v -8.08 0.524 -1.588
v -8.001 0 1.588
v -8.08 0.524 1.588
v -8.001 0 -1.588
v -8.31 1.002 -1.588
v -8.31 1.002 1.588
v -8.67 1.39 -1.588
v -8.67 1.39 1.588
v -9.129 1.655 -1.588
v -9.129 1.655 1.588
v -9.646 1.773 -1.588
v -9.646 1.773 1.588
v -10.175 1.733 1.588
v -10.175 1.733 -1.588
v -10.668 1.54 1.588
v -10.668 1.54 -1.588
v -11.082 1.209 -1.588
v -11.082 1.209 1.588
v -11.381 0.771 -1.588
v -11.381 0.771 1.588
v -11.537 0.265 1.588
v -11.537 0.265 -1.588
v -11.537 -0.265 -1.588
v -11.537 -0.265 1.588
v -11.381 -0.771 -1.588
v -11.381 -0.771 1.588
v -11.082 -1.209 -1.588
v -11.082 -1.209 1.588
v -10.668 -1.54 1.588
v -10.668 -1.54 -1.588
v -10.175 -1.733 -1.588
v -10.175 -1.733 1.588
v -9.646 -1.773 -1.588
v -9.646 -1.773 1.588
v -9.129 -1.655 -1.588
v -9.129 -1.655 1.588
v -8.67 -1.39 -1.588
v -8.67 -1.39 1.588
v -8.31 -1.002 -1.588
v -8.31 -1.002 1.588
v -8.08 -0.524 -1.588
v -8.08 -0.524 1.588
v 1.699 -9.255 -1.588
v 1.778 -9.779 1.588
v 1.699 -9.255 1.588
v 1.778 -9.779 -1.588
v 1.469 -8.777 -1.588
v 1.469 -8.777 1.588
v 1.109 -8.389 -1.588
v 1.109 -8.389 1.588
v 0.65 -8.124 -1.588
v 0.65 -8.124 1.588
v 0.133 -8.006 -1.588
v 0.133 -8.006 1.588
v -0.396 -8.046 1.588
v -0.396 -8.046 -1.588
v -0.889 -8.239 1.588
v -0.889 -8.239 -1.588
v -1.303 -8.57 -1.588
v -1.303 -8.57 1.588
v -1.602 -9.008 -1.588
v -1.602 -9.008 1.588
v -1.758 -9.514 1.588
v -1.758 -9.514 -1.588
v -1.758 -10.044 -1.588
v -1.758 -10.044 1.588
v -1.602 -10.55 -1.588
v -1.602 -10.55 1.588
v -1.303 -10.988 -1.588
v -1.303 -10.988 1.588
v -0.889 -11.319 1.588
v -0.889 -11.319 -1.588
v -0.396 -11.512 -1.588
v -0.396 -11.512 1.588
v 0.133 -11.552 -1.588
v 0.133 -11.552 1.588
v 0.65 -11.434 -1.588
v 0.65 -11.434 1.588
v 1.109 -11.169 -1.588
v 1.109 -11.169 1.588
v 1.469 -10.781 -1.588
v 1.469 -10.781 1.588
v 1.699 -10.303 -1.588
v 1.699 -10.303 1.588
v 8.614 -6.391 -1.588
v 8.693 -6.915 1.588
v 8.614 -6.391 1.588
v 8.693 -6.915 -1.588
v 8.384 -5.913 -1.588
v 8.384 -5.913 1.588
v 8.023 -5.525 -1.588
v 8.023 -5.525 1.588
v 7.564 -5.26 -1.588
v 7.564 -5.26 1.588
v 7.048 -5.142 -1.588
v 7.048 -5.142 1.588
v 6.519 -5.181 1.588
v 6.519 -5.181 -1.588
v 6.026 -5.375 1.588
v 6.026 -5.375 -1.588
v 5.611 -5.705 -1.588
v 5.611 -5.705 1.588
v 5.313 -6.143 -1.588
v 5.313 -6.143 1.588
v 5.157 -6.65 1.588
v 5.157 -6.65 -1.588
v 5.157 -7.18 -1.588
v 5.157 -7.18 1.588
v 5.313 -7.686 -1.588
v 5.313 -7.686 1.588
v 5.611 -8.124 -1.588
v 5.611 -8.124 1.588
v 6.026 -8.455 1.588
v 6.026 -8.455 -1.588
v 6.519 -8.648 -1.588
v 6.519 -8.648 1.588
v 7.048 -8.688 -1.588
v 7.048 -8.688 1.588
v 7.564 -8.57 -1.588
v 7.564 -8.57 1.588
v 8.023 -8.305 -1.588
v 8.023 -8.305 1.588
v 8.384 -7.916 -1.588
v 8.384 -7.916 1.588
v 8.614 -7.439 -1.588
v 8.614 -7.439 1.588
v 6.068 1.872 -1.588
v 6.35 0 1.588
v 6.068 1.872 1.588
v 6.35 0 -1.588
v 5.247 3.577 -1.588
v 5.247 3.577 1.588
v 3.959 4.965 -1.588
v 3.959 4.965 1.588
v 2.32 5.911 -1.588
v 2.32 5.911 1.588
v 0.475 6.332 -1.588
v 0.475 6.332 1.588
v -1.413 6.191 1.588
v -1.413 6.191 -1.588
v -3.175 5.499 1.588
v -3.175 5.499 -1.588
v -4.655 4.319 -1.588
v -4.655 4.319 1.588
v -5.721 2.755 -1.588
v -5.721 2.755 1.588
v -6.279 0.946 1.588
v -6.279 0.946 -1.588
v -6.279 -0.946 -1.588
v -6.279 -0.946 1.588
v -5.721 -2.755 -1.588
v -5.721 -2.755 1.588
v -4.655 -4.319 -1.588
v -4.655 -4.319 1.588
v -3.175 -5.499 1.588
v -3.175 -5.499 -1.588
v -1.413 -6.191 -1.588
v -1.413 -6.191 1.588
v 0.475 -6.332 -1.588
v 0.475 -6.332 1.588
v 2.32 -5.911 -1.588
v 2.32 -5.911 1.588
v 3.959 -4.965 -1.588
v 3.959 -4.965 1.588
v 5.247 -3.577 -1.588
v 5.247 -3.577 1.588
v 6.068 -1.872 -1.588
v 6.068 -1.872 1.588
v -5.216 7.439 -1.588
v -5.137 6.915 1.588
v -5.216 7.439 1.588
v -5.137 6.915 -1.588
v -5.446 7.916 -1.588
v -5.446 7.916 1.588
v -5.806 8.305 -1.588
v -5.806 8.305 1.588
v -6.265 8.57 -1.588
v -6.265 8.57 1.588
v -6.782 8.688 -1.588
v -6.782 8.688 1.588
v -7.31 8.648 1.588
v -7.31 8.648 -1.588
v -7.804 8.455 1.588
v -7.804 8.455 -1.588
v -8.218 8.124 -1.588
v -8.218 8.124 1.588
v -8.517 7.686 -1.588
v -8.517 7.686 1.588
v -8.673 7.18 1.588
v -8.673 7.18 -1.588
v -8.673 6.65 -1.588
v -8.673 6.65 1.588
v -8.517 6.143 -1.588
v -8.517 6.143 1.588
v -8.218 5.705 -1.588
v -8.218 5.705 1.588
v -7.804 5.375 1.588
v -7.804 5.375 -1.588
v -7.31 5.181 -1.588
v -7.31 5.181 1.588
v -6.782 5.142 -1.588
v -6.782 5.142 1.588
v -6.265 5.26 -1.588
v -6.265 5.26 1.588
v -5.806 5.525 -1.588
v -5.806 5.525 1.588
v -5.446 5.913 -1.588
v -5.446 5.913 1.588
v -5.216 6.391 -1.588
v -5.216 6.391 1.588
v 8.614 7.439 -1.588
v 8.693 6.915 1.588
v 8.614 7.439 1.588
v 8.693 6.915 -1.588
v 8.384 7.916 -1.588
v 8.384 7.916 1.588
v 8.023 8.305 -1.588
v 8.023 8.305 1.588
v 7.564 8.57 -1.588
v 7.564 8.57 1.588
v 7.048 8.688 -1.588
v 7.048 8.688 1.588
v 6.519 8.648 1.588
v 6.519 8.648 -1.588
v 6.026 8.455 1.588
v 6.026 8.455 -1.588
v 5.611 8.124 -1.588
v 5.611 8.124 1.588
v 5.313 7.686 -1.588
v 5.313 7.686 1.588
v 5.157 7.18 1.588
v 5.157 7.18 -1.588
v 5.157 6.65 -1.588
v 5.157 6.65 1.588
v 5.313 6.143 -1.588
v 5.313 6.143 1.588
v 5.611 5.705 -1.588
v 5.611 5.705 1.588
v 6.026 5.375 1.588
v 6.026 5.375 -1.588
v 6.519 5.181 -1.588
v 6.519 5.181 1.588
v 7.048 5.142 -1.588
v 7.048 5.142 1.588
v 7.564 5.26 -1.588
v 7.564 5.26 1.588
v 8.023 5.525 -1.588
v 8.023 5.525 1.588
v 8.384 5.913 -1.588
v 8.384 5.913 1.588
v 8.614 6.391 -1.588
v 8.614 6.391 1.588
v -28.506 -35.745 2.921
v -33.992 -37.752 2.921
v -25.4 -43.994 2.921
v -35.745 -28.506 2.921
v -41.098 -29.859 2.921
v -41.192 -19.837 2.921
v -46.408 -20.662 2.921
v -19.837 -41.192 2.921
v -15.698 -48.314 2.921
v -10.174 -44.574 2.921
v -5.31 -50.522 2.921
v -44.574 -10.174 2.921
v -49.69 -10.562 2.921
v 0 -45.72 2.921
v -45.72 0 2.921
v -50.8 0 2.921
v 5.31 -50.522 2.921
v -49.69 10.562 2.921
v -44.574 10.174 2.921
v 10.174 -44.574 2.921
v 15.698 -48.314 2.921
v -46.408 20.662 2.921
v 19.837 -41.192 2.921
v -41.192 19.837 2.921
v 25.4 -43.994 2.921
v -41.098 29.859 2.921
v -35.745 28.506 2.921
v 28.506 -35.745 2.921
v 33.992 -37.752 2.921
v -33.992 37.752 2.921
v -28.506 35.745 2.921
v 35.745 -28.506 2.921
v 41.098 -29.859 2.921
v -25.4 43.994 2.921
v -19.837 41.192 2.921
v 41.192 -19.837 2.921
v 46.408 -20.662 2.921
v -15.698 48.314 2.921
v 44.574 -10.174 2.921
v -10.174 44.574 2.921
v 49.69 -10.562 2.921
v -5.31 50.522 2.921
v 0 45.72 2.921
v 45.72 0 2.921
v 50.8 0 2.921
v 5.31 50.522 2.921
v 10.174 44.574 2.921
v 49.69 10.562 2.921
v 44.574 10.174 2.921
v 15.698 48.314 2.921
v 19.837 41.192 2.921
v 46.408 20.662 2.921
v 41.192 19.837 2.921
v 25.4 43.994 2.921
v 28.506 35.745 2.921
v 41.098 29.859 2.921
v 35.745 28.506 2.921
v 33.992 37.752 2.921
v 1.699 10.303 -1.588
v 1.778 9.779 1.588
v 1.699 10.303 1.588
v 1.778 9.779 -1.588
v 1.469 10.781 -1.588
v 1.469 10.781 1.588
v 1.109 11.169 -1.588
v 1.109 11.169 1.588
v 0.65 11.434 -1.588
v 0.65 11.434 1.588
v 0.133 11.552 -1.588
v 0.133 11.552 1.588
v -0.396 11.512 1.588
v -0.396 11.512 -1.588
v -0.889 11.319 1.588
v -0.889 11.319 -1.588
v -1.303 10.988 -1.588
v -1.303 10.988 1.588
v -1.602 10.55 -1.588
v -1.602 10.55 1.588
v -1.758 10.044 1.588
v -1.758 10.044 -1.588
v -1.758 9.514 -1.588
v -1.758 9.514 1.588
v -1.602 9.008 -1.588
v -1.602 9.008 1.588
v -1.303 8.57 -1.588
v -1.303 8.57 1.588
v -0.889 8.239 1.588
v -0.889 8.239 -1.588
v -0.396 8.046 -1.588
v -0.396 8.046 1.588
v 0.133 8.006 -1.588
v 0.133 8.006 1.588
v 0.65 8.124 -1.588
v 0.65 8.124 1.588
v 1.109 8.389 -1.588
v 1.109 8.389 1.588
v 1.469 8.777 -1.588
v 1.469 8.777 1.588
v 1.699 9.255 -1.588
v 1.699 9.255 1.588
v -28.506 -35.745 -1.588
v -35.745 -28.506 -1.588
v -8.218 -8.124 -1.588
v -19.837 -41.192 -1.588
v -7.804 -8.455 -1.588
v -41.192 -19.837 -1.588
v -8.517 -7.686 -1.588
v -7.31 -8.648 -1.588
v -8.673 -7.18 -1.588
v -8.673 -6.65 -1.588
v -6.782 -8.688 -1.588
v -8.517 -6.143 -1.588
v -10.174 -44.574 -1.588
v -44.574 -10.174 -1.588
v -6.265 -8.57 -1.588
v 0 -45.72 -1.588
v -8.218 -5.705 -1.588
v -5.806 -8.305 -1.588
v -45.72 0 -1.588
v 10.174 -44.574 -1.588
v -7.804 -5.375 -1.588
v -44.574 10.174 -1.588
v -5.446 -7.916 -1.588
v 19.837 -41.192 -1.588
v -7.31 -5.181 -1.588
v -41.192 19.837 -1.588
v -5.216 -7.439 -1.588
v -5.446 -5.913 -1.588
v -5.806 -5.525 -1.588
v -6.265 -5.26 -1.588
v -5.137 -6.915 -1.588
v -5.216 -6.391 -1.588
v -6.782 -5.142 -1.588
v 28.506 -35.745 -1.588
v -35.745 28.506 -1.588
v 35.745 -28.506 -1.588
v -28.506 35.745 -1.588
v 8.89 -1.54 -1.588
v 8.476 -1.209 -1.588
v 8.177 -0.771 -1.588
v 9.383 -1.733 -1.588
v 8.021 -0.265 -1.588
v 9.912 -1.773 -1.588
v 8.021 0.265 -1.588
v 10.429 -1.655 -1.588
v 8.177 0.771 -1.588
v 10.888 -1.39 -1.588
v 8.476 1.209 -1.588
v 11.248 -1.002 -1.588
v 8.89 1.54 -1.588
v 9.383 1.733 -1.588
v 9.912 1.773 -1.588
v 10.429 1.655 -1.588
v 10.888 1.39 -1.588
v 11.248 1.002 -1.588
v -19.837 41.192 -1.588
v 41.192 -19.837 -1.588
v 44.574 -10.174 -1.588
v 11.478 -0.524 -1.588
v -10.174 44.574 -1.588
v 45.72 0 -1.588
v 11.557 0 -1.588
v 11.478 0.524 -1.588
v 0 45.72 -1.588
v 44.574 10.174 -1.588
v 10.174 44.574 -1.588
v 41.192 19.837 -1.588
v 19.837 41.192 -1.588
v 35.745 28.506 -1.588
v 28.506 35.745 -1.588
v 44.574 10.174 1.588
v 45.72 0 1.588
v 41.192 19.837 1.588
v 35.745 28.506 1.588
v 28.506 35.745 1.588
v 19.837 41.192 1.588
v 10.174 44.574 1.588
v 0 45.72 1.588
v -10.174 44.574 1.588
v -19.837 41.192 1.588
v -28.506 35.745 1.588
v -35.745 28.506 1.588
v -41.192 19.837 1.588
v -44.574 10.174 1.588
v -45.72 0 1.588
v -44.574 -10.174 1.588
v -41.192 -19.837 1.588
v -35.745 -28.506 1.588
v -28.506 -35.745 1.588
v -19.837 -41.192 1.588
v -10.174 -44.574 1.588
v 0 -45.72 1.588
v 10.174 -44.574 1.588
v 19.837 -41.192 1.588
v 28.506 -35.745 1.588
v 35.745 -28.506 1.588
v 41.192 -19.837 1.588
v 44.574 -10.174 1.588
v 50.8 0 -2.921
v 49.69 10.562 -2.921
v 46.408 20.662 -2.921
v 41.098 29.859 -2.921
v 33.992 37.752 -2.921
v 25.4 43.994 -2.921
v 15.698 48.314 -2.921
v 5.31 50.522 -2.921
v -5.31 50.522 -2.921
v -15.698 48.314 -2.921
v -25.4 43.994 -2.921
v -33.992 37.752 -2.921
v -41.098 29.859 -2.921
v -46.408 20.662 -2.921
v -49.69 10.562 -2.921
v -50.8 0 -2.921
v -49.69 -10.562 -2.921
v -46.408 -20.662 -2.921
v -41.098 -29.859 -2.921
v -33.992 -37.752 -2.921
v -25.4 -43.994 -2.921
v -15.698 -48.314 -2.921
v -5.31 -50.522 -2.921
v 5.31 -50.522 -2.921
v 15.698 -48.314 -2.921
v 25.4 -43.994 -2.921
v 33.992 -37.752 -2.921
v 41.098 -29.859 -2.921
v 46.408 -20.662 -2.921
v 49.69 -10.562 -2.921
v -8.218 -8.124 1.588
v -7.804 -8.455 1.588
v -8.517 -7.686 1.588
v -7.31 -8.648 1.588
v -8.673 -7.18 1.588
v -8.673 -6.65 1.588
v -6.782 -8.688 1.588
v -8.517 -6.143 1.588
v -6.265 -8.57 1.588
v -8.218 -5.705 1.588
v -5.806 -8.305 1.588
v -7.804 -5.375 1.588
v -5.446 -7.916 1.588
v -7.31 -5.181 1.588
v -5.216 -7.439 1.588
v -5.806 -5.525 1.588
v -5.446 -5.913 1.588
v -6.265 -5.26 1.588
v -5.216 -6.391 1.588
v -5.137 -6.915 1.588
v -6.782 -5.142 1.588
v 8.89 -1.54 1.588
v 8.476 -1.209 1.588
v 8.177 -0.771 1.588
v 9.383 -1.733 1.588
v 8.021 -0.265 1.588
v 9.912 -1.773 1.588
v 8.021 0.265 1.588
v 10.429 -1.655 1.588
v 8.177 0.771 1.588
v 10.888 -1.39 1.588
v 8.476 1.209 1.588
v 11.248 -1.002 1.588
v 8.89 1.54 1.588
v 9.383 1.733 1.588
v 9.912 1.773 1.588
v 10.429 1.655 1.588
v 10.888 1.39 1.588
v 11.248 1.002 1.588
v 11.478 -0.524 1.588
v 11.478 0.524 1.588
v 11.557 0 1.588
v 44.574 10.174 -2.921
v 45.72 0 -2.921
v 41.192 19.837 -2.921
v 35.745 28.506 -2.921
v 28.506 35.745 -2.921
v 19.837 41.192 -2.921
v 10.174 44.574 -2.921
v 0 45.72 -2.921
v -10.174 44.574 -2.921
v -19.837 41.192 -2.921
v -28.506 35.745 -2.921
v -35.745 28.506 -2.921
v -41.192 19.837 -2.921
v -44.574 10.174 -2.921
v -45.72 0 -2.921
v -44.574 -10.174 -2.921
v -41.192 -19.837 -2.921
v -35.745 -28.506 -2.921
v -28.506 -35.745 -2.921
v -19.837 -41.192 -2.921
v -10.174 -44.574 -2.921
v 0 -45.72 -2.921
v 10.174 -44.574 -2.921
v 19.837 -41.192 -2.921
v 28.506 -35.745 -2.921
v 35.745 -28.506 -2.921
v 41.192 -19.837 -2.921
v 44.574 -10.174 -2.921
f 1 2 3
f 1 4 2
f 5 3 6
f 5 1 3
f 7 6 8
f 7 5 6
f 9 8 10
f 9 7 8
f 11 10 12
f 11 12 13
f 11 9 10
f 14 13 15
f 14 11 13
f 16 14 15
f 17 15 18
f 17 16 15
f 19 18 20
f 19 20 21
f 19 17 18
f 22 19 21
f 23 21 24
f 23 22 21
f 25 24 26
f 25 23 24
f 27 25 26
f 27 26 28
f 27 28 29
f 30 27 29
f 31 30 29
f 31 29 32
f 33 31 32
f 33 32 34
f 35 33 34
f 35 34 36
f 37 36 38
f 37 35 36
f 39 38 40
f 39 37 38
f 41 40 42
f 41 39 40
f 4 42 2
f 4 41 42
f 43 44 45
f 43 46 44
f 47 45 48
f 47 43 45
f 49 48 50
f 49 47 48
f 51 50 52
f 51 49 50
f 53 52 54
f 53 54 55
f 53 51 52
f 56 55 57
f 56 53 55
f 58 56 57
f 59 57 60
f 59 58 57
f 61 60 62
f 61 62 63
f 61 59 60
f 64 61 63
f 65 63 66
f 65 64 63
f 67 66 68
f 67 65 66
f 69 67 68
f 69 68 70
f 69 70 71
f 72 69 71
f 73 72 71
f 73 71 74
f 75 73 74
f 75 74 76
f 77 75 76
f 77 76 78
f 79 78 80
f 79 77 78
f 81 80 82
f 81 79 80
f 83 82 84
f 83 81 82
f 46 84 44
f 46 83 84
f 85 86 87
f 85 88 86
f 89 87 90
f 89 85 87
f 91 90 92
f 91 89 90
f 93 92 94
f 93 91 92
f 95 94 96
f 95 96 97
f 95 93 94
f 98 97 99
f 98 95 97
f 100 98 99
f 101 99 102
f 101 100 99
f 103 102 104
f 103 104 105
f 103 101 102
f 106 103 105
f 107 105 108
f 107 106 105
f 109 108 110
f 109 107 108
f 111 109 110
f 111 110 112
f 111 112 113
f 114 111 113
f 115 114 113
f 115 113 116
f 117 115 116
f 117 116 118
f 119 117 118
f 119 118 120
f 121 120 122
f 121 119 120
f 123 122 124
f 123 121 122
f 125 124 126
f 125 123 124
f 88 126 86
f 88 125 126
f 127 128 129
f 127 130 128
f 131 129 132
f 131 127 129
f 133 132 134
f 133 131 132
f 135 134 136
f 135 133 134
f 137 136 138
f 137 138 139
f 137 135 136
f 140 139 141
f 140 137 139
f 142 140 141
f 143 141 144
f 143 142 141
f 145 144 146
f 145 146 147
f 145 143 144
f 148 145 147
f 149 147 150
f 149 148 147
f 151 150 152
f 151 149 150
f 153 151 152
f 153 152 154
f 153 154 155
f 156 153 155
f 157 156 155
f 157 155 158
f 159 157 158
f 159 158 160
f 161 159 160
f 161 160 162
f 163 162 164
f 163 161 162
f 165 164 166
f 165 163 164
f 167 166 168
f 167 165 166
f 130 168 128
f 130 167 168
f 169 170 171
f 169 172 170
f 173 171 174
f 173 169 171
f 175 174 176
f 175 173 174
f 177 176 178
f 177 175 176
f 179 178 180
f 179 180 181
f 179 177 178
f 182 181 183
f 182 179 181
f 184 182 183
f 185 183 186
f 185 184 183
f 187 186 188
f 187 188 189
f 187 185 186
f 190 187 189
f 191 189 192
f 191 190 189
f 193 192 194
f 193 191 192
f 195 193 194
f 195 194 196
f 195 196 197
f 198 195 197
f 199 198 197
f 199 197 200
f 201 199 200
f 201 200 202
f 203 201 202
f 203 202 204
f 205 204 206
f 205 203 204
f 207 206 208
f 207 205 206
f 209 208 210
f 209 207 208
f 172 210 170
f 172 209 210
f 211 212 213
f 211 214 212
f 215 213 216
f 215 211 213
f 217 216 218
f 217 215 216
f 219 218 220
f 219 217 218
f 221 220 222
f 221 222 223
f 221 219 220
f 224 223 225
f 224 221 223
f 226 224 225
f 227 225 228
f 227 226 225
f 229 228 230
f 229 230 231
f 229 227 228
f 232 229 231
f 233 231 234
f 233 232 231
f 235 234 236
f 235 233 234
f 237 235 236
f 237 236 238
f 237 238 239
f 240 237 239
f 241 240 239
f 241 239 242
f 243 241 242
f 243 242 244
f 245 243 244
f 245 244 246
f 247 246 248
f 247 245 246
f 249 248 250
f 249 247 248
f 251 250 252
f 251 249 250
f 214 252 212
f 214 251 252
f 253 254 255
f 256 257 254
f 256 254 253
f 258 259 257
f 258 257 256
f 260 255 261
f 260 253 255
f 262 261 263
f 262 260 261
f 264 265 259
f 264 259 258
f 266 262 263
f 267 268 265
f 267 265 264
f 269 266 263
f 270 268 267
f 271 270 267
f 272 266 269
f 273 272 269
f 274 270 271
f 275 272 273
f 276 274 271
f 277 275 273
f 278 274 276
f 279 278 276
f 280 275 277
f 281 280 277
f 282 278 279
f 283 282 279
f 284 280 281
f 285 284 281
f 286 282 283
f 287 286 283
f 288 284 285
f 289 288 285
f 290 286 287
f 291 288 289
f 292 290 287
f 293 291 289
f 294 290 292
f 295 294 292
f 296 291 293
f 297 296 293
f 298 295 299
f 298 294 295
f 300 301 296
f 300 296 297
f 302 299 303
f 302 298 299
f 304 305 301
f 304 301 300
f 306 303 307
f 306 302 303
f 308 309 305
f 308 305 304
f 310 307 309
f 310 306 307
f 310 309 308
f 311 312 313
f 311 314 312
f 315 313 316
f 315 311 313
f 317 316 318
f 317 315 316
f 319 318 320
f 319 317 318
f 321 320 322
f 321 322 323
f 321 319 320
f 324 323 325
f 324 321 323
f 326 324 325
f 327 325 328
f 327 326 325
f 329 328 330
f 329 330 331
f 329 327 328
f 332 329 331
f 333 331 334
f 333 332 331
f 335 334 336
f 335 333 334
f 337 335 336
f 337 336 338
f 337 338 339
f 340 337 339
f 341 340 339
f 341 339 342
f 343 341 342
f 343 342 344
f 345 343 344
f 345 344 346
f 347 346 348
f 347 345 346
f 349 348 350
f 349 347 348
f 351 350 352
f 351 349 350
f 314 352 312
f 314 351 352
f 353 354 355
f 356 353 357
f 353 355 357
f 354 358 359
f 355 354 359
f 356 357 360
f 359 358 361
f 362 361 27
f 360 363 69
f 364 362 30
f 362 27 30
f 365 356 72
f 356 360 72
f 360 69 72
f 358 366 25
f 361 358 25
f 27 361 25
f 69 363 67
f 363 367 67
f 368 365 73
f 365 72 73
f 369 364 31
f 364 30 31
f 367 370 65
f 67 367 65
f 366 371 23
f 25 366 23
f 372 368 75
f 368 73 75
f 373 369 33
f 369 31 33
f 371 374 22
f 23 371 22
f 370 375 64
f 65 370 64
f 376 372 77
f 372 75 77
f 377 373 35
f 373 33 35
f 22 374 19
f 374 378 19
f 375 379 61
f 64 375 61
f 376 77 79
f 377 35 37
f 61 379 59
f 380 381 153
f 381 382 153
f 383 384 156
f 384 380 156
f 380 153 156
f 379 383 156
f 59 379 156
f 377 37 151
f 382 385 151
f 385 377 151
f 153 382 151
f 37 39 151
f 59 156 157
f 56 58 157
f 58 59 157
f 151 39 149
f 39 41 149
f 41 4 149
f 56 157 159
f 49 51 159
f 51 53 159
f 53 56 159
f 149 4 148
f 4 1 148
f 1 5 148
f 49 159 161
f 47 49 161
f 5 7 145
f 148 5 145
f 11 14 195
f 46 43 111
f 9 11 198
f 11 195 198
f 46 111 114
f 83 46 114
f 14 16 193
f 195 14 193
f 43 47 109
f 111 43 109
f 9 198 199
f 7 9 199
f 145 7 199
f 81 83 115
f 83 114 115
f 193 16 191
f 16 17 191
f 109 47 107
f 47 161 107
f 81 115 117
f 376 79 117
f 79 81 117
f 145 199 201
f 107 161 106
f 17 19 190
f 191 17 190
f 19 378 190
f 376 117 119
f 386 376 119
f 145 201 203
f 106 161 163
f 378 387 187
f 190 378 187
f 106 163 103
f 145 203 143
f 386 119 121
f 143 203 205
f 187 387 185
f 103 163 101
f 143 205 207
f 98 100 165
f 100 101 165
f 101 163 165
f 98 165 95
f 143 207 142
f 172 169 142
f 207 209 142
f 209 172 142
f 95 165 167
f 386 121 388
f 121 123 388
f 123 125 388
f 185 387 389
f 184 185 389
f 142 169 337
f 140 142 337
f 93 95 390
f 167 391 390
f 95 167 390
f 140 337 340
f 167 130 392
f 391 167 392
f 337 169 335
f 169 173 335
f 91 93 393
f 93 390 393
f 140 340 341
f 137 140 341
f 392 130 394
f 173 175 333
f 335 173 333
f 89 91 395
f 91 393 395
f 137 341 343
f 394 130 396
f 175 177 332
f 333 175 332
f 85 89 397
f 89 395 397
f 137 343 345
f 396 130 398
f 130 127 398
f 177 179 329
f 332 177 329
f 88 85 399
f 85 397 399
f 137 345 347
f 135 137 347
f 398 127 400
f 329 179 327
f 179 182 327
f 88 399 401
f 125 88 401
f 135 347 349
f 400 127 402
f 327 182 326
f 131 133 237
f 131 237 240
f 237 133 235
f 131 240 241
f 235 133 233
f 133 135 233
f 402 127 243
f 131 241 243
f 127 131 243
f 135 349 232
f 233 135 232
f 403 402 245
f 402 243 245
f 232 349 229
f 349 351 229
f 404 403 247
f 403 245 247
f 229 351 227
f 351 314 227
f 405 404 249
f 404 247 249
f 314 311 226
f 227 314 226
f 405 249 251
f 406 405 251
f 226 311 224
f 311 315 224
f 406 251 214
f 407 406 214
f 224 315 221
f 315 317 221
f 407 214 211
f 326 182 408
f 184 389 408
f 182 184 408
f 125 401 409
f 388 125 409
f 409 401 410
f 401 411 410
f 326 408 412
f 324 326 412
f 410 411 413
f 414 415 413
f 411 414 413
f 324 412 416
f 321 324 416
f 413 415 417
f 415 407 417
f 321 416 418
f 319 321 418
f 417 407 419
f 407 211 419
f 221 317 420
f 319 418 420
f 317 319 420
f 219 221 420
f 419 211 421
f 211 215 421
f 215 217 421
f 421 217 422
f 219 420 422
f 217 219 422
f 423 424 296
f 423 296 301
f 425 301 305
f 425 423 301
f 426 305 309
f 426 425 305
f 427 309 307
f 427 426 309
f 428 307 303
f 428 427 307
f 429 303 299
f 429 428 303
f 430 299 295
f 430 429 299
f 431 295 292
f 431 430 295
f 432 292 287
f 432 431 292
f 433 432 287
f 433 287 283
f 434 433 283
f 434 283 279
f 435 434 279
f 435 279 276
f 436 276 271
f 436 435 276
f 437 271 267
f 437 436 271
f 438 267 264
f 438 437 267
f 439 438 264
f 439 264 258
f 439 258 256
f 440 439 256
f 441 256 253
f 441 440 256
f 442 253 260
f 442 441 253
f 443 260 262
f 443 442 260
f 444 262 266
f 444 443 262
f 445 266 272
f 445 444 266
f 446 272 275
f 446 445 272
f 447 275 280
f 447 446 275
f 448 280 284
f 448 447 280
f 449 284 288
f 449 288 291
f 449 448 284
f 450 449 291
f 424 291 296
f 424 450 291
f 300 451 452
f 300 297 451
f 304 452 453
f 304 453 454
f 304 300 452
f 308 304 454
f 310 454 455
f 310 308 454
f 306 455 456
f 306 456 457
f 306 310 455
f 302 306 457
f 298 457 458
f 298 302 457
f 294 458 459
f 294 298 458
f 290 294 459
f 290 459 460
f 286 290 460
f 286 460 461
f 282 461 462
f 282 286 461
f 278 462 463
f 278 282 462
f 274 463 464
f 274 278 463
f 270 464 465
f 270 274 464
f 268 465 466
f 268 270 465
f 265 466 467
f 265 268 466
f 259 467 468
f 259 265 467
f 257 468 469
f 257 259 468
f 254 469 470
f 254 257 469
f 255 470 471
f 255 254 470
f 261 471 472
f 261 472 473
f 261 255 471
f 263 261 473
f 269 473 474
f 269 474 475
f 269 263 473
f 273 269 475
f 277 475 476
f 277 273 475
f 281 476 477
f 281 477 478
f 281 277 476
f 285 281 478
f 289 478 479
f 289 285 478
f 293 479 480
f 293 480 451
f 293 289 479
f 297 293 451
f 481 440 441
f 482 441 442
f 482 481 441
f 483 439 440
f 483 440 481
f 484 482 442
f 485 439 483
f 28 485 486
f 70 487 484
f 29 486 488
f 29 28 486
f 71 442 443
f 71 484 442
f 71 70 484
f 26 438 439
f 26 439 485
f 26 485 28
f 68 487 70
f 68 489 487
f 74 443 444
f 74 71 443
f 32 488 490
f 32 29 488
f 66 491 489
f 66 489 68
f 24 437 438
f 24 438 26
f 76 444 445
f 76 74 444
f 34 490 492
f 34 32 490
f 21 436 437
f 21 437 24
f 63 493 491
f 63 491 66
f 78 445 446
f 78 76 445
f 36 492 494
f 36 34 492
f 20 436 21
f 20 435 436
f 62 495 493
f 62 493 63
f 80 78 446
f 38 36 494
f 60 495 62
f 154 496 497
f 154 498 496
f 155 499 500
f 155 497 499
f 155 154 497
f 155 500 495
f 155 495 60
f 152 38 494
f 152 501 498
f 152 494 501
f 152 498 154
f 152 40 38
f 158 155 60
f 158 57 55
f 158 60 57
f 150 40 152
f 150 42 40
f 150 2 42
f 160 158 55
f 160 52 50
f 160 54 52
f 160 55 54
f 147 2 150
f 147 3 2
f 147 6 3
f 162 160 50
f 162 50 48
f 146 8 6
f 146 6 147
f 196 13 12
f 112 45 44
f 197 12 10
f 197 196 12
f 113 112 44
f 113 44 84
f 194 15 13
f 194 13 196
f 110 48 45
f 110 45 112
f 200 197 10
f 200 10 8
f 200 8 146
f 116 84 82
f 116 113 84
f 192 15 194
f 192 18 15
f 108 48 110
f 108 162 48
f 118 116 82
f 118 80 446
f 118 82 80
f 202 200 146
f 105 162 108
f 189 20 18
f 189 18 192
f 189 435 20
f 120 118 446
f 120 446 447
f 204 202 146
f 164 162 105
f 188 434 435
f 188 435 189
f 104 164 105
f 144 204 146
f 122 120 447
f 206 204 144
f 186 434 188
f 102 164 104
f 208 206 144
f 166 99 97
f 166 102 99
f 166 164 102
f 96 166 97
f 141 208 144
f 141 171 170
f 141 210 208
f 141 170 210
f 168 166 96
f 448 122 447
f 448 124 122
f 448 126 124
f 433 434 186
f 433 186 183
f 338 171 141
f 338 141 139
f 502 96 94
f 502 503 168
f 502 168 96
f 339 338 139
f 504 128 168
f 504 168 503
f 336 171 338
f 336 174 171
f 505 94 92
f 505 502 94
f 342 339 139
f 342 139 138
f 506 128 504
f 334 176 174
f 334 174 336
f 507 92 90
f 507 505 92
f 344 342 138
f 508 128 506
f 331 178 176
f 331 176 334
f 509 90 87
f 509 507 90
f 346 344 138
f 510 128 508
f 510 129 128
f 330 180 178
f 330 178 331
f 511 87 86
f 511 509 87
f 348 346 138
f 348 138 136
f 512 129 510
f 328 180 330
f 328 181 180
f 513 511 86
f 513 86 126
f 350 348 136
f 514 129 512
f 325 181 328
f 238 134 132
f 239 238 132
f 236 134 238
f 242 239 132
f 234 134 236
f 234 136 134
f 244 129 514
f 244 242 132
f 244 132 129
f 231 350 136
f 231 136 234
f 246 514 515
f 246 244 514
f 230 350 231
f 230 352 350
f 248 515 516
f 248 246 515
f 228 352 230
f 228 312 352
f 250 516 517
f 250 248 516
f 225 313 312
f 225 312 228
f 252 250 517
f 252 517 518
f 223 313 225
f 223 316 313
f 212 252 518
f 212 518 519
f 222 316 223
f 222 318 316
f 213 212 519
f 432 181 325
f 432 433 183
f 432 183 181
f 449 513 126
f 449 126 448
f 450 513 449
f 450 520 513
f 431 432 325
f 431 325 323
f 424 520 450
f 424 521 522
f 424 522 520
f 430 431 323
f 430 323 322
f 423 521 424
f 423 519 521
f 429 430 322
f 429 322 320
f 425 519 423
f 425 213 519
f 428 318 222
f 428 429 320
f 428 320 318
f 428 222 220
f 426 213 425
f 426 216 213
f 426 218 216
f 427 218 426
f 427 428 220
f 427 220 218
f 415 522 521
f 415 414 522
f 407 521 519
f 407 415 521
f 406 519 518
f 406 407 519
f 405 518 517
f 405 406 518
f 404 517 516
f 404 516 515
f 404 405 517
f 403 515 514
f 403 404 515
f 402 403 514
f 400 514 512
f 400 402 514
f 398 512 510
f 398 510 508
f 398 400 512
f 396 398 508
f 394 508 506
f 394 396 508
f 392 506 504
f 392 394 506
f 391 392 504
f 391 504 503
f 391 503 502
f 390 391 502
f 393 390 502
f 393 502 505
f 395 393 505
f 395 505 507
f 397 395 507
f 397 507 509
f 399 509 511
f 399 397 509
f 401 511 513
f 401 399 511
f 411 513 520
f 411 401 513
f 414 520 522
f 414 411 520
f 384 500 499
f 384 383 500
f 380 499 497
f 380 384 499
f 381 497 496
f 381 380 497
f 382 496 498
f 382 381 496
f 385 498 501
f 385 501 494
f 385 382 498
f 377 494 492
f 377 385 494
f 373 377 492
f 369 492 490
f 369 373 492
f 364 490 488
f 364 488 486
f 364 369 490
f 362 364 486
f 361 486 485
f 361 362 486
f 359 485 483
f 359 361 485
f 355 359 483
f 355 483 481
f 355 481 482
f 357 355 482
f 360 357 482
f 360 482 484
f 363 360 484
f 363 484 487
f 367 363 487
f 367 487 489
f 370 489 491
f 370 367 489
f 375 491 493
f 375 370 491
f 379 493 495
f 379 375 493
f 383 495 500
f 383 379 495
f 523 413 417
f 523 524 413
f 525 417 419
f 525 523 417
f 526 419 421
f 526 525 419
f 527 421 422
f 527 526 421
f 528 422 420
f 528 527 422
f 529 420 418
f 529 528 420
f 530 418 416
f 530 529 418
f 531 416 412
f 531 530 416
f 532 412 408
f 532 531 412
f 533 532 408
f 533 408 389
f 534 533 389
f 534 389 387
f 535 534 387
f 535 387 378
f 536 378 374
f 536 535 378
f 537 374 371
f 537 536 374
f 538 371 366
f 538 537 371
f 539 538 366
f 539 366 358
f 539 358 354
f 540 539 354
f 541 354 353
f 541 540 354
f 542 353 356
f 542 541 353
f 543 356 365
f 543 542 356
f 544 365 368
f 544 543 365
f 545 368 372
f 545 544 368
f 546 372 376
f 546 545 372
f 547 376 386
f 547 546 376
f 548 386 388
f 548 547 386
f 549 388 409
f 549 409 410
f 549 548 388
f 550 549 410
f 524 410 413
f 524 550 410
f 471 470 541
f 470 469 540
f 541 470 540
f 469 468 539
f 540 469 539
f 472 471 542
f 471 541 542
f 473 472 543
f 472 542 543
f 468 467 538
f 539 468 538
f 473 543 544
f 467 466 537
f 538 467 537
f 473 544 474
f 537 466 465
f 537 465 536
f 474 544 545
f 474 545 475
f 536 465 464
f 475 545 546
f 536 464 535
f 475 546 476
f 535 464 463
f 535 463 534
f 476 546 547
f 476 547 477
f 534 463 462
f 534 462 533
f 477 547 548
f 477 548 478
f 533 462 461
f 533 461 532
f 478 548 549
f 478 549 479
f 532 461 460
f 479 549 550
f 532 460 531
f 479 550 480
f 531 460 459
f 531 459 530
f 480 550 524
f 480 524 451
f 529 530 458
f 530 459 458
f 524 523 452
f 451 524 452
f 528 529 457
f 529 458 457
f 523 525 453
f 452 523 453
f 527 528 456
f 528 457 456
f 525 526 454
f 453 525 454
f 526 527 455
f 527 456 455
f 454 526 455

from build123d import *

# Parameters (mm, degrees)
SKETCH1_R           = 50.8
SKETCH1_R_2         = 45.72
BOSS_EXTRUDE1_DEPTH = 2.921
SKETCH3_R           = 45.72
SKETCH3_R_2         = 6.35
SKETCH3_R_3         = 1.778
BOSS_EXTRUDE2_DEPTH = 1.5875


with BuildPart() as part:
    # Sketch1 → Boss-Extrude1 (new body, symmetric)
    with BuildSketch(Plane.XY):
        Circle(SKETCH1_R)
        Circle(SKETCH1_R_2, mode=Mode.SUBTRACT)
    extrude(amount=BOSS_EXTRUDE1_DEPTH, both=True)

    # Sketch3 → Boss-Extrude2 (add, symmetric)
    with BuildSketch(Plane.XY):
        Circle(SKETCH3_R)
        Circle(SKETCH3_R_2, mode=Mode.SUBTRACT)
        with Locations((0, 9.779)):
            Circle(SKETCH3_R_3, mode=Mode.SUBTRACT)
        with Locations((6.914797213, 6.914797213)):
            Circle(SKETCH3_R_3, mode=Mode.SUBTRACT)
        with Locations((9.779, 0)):
            Circle(SKETCH3_R_3, mode=Mode.SUBTRACT)
        with Locations((6.914797213, -6.914797213)):
            Circle(SKETCH3_R_3, mode=Mode.SUBTRACT)
        with Locations((0, -9.779)):
            Circle(SKETCH3_R_3, mode=Mode.SUBTRACT)
        with Locations((-6.914797213, -6.914797213)):
            Circle(SKETCH3_R_3, mode=Mode.SUBTRACT)
        with Locations((-9.779, 0)):
            Circle(SKETCH3_R_3, mode=Mode.SUBTRACT)
        with Locations((-6.914797213, 6.914797213)):
            Circle(SKETCH3_R_3, mode=Mode.SUBTRACT)
    extrude(amount=BOSS_EXTRUDE2_DEPTH, both=True)


solid = part.part
